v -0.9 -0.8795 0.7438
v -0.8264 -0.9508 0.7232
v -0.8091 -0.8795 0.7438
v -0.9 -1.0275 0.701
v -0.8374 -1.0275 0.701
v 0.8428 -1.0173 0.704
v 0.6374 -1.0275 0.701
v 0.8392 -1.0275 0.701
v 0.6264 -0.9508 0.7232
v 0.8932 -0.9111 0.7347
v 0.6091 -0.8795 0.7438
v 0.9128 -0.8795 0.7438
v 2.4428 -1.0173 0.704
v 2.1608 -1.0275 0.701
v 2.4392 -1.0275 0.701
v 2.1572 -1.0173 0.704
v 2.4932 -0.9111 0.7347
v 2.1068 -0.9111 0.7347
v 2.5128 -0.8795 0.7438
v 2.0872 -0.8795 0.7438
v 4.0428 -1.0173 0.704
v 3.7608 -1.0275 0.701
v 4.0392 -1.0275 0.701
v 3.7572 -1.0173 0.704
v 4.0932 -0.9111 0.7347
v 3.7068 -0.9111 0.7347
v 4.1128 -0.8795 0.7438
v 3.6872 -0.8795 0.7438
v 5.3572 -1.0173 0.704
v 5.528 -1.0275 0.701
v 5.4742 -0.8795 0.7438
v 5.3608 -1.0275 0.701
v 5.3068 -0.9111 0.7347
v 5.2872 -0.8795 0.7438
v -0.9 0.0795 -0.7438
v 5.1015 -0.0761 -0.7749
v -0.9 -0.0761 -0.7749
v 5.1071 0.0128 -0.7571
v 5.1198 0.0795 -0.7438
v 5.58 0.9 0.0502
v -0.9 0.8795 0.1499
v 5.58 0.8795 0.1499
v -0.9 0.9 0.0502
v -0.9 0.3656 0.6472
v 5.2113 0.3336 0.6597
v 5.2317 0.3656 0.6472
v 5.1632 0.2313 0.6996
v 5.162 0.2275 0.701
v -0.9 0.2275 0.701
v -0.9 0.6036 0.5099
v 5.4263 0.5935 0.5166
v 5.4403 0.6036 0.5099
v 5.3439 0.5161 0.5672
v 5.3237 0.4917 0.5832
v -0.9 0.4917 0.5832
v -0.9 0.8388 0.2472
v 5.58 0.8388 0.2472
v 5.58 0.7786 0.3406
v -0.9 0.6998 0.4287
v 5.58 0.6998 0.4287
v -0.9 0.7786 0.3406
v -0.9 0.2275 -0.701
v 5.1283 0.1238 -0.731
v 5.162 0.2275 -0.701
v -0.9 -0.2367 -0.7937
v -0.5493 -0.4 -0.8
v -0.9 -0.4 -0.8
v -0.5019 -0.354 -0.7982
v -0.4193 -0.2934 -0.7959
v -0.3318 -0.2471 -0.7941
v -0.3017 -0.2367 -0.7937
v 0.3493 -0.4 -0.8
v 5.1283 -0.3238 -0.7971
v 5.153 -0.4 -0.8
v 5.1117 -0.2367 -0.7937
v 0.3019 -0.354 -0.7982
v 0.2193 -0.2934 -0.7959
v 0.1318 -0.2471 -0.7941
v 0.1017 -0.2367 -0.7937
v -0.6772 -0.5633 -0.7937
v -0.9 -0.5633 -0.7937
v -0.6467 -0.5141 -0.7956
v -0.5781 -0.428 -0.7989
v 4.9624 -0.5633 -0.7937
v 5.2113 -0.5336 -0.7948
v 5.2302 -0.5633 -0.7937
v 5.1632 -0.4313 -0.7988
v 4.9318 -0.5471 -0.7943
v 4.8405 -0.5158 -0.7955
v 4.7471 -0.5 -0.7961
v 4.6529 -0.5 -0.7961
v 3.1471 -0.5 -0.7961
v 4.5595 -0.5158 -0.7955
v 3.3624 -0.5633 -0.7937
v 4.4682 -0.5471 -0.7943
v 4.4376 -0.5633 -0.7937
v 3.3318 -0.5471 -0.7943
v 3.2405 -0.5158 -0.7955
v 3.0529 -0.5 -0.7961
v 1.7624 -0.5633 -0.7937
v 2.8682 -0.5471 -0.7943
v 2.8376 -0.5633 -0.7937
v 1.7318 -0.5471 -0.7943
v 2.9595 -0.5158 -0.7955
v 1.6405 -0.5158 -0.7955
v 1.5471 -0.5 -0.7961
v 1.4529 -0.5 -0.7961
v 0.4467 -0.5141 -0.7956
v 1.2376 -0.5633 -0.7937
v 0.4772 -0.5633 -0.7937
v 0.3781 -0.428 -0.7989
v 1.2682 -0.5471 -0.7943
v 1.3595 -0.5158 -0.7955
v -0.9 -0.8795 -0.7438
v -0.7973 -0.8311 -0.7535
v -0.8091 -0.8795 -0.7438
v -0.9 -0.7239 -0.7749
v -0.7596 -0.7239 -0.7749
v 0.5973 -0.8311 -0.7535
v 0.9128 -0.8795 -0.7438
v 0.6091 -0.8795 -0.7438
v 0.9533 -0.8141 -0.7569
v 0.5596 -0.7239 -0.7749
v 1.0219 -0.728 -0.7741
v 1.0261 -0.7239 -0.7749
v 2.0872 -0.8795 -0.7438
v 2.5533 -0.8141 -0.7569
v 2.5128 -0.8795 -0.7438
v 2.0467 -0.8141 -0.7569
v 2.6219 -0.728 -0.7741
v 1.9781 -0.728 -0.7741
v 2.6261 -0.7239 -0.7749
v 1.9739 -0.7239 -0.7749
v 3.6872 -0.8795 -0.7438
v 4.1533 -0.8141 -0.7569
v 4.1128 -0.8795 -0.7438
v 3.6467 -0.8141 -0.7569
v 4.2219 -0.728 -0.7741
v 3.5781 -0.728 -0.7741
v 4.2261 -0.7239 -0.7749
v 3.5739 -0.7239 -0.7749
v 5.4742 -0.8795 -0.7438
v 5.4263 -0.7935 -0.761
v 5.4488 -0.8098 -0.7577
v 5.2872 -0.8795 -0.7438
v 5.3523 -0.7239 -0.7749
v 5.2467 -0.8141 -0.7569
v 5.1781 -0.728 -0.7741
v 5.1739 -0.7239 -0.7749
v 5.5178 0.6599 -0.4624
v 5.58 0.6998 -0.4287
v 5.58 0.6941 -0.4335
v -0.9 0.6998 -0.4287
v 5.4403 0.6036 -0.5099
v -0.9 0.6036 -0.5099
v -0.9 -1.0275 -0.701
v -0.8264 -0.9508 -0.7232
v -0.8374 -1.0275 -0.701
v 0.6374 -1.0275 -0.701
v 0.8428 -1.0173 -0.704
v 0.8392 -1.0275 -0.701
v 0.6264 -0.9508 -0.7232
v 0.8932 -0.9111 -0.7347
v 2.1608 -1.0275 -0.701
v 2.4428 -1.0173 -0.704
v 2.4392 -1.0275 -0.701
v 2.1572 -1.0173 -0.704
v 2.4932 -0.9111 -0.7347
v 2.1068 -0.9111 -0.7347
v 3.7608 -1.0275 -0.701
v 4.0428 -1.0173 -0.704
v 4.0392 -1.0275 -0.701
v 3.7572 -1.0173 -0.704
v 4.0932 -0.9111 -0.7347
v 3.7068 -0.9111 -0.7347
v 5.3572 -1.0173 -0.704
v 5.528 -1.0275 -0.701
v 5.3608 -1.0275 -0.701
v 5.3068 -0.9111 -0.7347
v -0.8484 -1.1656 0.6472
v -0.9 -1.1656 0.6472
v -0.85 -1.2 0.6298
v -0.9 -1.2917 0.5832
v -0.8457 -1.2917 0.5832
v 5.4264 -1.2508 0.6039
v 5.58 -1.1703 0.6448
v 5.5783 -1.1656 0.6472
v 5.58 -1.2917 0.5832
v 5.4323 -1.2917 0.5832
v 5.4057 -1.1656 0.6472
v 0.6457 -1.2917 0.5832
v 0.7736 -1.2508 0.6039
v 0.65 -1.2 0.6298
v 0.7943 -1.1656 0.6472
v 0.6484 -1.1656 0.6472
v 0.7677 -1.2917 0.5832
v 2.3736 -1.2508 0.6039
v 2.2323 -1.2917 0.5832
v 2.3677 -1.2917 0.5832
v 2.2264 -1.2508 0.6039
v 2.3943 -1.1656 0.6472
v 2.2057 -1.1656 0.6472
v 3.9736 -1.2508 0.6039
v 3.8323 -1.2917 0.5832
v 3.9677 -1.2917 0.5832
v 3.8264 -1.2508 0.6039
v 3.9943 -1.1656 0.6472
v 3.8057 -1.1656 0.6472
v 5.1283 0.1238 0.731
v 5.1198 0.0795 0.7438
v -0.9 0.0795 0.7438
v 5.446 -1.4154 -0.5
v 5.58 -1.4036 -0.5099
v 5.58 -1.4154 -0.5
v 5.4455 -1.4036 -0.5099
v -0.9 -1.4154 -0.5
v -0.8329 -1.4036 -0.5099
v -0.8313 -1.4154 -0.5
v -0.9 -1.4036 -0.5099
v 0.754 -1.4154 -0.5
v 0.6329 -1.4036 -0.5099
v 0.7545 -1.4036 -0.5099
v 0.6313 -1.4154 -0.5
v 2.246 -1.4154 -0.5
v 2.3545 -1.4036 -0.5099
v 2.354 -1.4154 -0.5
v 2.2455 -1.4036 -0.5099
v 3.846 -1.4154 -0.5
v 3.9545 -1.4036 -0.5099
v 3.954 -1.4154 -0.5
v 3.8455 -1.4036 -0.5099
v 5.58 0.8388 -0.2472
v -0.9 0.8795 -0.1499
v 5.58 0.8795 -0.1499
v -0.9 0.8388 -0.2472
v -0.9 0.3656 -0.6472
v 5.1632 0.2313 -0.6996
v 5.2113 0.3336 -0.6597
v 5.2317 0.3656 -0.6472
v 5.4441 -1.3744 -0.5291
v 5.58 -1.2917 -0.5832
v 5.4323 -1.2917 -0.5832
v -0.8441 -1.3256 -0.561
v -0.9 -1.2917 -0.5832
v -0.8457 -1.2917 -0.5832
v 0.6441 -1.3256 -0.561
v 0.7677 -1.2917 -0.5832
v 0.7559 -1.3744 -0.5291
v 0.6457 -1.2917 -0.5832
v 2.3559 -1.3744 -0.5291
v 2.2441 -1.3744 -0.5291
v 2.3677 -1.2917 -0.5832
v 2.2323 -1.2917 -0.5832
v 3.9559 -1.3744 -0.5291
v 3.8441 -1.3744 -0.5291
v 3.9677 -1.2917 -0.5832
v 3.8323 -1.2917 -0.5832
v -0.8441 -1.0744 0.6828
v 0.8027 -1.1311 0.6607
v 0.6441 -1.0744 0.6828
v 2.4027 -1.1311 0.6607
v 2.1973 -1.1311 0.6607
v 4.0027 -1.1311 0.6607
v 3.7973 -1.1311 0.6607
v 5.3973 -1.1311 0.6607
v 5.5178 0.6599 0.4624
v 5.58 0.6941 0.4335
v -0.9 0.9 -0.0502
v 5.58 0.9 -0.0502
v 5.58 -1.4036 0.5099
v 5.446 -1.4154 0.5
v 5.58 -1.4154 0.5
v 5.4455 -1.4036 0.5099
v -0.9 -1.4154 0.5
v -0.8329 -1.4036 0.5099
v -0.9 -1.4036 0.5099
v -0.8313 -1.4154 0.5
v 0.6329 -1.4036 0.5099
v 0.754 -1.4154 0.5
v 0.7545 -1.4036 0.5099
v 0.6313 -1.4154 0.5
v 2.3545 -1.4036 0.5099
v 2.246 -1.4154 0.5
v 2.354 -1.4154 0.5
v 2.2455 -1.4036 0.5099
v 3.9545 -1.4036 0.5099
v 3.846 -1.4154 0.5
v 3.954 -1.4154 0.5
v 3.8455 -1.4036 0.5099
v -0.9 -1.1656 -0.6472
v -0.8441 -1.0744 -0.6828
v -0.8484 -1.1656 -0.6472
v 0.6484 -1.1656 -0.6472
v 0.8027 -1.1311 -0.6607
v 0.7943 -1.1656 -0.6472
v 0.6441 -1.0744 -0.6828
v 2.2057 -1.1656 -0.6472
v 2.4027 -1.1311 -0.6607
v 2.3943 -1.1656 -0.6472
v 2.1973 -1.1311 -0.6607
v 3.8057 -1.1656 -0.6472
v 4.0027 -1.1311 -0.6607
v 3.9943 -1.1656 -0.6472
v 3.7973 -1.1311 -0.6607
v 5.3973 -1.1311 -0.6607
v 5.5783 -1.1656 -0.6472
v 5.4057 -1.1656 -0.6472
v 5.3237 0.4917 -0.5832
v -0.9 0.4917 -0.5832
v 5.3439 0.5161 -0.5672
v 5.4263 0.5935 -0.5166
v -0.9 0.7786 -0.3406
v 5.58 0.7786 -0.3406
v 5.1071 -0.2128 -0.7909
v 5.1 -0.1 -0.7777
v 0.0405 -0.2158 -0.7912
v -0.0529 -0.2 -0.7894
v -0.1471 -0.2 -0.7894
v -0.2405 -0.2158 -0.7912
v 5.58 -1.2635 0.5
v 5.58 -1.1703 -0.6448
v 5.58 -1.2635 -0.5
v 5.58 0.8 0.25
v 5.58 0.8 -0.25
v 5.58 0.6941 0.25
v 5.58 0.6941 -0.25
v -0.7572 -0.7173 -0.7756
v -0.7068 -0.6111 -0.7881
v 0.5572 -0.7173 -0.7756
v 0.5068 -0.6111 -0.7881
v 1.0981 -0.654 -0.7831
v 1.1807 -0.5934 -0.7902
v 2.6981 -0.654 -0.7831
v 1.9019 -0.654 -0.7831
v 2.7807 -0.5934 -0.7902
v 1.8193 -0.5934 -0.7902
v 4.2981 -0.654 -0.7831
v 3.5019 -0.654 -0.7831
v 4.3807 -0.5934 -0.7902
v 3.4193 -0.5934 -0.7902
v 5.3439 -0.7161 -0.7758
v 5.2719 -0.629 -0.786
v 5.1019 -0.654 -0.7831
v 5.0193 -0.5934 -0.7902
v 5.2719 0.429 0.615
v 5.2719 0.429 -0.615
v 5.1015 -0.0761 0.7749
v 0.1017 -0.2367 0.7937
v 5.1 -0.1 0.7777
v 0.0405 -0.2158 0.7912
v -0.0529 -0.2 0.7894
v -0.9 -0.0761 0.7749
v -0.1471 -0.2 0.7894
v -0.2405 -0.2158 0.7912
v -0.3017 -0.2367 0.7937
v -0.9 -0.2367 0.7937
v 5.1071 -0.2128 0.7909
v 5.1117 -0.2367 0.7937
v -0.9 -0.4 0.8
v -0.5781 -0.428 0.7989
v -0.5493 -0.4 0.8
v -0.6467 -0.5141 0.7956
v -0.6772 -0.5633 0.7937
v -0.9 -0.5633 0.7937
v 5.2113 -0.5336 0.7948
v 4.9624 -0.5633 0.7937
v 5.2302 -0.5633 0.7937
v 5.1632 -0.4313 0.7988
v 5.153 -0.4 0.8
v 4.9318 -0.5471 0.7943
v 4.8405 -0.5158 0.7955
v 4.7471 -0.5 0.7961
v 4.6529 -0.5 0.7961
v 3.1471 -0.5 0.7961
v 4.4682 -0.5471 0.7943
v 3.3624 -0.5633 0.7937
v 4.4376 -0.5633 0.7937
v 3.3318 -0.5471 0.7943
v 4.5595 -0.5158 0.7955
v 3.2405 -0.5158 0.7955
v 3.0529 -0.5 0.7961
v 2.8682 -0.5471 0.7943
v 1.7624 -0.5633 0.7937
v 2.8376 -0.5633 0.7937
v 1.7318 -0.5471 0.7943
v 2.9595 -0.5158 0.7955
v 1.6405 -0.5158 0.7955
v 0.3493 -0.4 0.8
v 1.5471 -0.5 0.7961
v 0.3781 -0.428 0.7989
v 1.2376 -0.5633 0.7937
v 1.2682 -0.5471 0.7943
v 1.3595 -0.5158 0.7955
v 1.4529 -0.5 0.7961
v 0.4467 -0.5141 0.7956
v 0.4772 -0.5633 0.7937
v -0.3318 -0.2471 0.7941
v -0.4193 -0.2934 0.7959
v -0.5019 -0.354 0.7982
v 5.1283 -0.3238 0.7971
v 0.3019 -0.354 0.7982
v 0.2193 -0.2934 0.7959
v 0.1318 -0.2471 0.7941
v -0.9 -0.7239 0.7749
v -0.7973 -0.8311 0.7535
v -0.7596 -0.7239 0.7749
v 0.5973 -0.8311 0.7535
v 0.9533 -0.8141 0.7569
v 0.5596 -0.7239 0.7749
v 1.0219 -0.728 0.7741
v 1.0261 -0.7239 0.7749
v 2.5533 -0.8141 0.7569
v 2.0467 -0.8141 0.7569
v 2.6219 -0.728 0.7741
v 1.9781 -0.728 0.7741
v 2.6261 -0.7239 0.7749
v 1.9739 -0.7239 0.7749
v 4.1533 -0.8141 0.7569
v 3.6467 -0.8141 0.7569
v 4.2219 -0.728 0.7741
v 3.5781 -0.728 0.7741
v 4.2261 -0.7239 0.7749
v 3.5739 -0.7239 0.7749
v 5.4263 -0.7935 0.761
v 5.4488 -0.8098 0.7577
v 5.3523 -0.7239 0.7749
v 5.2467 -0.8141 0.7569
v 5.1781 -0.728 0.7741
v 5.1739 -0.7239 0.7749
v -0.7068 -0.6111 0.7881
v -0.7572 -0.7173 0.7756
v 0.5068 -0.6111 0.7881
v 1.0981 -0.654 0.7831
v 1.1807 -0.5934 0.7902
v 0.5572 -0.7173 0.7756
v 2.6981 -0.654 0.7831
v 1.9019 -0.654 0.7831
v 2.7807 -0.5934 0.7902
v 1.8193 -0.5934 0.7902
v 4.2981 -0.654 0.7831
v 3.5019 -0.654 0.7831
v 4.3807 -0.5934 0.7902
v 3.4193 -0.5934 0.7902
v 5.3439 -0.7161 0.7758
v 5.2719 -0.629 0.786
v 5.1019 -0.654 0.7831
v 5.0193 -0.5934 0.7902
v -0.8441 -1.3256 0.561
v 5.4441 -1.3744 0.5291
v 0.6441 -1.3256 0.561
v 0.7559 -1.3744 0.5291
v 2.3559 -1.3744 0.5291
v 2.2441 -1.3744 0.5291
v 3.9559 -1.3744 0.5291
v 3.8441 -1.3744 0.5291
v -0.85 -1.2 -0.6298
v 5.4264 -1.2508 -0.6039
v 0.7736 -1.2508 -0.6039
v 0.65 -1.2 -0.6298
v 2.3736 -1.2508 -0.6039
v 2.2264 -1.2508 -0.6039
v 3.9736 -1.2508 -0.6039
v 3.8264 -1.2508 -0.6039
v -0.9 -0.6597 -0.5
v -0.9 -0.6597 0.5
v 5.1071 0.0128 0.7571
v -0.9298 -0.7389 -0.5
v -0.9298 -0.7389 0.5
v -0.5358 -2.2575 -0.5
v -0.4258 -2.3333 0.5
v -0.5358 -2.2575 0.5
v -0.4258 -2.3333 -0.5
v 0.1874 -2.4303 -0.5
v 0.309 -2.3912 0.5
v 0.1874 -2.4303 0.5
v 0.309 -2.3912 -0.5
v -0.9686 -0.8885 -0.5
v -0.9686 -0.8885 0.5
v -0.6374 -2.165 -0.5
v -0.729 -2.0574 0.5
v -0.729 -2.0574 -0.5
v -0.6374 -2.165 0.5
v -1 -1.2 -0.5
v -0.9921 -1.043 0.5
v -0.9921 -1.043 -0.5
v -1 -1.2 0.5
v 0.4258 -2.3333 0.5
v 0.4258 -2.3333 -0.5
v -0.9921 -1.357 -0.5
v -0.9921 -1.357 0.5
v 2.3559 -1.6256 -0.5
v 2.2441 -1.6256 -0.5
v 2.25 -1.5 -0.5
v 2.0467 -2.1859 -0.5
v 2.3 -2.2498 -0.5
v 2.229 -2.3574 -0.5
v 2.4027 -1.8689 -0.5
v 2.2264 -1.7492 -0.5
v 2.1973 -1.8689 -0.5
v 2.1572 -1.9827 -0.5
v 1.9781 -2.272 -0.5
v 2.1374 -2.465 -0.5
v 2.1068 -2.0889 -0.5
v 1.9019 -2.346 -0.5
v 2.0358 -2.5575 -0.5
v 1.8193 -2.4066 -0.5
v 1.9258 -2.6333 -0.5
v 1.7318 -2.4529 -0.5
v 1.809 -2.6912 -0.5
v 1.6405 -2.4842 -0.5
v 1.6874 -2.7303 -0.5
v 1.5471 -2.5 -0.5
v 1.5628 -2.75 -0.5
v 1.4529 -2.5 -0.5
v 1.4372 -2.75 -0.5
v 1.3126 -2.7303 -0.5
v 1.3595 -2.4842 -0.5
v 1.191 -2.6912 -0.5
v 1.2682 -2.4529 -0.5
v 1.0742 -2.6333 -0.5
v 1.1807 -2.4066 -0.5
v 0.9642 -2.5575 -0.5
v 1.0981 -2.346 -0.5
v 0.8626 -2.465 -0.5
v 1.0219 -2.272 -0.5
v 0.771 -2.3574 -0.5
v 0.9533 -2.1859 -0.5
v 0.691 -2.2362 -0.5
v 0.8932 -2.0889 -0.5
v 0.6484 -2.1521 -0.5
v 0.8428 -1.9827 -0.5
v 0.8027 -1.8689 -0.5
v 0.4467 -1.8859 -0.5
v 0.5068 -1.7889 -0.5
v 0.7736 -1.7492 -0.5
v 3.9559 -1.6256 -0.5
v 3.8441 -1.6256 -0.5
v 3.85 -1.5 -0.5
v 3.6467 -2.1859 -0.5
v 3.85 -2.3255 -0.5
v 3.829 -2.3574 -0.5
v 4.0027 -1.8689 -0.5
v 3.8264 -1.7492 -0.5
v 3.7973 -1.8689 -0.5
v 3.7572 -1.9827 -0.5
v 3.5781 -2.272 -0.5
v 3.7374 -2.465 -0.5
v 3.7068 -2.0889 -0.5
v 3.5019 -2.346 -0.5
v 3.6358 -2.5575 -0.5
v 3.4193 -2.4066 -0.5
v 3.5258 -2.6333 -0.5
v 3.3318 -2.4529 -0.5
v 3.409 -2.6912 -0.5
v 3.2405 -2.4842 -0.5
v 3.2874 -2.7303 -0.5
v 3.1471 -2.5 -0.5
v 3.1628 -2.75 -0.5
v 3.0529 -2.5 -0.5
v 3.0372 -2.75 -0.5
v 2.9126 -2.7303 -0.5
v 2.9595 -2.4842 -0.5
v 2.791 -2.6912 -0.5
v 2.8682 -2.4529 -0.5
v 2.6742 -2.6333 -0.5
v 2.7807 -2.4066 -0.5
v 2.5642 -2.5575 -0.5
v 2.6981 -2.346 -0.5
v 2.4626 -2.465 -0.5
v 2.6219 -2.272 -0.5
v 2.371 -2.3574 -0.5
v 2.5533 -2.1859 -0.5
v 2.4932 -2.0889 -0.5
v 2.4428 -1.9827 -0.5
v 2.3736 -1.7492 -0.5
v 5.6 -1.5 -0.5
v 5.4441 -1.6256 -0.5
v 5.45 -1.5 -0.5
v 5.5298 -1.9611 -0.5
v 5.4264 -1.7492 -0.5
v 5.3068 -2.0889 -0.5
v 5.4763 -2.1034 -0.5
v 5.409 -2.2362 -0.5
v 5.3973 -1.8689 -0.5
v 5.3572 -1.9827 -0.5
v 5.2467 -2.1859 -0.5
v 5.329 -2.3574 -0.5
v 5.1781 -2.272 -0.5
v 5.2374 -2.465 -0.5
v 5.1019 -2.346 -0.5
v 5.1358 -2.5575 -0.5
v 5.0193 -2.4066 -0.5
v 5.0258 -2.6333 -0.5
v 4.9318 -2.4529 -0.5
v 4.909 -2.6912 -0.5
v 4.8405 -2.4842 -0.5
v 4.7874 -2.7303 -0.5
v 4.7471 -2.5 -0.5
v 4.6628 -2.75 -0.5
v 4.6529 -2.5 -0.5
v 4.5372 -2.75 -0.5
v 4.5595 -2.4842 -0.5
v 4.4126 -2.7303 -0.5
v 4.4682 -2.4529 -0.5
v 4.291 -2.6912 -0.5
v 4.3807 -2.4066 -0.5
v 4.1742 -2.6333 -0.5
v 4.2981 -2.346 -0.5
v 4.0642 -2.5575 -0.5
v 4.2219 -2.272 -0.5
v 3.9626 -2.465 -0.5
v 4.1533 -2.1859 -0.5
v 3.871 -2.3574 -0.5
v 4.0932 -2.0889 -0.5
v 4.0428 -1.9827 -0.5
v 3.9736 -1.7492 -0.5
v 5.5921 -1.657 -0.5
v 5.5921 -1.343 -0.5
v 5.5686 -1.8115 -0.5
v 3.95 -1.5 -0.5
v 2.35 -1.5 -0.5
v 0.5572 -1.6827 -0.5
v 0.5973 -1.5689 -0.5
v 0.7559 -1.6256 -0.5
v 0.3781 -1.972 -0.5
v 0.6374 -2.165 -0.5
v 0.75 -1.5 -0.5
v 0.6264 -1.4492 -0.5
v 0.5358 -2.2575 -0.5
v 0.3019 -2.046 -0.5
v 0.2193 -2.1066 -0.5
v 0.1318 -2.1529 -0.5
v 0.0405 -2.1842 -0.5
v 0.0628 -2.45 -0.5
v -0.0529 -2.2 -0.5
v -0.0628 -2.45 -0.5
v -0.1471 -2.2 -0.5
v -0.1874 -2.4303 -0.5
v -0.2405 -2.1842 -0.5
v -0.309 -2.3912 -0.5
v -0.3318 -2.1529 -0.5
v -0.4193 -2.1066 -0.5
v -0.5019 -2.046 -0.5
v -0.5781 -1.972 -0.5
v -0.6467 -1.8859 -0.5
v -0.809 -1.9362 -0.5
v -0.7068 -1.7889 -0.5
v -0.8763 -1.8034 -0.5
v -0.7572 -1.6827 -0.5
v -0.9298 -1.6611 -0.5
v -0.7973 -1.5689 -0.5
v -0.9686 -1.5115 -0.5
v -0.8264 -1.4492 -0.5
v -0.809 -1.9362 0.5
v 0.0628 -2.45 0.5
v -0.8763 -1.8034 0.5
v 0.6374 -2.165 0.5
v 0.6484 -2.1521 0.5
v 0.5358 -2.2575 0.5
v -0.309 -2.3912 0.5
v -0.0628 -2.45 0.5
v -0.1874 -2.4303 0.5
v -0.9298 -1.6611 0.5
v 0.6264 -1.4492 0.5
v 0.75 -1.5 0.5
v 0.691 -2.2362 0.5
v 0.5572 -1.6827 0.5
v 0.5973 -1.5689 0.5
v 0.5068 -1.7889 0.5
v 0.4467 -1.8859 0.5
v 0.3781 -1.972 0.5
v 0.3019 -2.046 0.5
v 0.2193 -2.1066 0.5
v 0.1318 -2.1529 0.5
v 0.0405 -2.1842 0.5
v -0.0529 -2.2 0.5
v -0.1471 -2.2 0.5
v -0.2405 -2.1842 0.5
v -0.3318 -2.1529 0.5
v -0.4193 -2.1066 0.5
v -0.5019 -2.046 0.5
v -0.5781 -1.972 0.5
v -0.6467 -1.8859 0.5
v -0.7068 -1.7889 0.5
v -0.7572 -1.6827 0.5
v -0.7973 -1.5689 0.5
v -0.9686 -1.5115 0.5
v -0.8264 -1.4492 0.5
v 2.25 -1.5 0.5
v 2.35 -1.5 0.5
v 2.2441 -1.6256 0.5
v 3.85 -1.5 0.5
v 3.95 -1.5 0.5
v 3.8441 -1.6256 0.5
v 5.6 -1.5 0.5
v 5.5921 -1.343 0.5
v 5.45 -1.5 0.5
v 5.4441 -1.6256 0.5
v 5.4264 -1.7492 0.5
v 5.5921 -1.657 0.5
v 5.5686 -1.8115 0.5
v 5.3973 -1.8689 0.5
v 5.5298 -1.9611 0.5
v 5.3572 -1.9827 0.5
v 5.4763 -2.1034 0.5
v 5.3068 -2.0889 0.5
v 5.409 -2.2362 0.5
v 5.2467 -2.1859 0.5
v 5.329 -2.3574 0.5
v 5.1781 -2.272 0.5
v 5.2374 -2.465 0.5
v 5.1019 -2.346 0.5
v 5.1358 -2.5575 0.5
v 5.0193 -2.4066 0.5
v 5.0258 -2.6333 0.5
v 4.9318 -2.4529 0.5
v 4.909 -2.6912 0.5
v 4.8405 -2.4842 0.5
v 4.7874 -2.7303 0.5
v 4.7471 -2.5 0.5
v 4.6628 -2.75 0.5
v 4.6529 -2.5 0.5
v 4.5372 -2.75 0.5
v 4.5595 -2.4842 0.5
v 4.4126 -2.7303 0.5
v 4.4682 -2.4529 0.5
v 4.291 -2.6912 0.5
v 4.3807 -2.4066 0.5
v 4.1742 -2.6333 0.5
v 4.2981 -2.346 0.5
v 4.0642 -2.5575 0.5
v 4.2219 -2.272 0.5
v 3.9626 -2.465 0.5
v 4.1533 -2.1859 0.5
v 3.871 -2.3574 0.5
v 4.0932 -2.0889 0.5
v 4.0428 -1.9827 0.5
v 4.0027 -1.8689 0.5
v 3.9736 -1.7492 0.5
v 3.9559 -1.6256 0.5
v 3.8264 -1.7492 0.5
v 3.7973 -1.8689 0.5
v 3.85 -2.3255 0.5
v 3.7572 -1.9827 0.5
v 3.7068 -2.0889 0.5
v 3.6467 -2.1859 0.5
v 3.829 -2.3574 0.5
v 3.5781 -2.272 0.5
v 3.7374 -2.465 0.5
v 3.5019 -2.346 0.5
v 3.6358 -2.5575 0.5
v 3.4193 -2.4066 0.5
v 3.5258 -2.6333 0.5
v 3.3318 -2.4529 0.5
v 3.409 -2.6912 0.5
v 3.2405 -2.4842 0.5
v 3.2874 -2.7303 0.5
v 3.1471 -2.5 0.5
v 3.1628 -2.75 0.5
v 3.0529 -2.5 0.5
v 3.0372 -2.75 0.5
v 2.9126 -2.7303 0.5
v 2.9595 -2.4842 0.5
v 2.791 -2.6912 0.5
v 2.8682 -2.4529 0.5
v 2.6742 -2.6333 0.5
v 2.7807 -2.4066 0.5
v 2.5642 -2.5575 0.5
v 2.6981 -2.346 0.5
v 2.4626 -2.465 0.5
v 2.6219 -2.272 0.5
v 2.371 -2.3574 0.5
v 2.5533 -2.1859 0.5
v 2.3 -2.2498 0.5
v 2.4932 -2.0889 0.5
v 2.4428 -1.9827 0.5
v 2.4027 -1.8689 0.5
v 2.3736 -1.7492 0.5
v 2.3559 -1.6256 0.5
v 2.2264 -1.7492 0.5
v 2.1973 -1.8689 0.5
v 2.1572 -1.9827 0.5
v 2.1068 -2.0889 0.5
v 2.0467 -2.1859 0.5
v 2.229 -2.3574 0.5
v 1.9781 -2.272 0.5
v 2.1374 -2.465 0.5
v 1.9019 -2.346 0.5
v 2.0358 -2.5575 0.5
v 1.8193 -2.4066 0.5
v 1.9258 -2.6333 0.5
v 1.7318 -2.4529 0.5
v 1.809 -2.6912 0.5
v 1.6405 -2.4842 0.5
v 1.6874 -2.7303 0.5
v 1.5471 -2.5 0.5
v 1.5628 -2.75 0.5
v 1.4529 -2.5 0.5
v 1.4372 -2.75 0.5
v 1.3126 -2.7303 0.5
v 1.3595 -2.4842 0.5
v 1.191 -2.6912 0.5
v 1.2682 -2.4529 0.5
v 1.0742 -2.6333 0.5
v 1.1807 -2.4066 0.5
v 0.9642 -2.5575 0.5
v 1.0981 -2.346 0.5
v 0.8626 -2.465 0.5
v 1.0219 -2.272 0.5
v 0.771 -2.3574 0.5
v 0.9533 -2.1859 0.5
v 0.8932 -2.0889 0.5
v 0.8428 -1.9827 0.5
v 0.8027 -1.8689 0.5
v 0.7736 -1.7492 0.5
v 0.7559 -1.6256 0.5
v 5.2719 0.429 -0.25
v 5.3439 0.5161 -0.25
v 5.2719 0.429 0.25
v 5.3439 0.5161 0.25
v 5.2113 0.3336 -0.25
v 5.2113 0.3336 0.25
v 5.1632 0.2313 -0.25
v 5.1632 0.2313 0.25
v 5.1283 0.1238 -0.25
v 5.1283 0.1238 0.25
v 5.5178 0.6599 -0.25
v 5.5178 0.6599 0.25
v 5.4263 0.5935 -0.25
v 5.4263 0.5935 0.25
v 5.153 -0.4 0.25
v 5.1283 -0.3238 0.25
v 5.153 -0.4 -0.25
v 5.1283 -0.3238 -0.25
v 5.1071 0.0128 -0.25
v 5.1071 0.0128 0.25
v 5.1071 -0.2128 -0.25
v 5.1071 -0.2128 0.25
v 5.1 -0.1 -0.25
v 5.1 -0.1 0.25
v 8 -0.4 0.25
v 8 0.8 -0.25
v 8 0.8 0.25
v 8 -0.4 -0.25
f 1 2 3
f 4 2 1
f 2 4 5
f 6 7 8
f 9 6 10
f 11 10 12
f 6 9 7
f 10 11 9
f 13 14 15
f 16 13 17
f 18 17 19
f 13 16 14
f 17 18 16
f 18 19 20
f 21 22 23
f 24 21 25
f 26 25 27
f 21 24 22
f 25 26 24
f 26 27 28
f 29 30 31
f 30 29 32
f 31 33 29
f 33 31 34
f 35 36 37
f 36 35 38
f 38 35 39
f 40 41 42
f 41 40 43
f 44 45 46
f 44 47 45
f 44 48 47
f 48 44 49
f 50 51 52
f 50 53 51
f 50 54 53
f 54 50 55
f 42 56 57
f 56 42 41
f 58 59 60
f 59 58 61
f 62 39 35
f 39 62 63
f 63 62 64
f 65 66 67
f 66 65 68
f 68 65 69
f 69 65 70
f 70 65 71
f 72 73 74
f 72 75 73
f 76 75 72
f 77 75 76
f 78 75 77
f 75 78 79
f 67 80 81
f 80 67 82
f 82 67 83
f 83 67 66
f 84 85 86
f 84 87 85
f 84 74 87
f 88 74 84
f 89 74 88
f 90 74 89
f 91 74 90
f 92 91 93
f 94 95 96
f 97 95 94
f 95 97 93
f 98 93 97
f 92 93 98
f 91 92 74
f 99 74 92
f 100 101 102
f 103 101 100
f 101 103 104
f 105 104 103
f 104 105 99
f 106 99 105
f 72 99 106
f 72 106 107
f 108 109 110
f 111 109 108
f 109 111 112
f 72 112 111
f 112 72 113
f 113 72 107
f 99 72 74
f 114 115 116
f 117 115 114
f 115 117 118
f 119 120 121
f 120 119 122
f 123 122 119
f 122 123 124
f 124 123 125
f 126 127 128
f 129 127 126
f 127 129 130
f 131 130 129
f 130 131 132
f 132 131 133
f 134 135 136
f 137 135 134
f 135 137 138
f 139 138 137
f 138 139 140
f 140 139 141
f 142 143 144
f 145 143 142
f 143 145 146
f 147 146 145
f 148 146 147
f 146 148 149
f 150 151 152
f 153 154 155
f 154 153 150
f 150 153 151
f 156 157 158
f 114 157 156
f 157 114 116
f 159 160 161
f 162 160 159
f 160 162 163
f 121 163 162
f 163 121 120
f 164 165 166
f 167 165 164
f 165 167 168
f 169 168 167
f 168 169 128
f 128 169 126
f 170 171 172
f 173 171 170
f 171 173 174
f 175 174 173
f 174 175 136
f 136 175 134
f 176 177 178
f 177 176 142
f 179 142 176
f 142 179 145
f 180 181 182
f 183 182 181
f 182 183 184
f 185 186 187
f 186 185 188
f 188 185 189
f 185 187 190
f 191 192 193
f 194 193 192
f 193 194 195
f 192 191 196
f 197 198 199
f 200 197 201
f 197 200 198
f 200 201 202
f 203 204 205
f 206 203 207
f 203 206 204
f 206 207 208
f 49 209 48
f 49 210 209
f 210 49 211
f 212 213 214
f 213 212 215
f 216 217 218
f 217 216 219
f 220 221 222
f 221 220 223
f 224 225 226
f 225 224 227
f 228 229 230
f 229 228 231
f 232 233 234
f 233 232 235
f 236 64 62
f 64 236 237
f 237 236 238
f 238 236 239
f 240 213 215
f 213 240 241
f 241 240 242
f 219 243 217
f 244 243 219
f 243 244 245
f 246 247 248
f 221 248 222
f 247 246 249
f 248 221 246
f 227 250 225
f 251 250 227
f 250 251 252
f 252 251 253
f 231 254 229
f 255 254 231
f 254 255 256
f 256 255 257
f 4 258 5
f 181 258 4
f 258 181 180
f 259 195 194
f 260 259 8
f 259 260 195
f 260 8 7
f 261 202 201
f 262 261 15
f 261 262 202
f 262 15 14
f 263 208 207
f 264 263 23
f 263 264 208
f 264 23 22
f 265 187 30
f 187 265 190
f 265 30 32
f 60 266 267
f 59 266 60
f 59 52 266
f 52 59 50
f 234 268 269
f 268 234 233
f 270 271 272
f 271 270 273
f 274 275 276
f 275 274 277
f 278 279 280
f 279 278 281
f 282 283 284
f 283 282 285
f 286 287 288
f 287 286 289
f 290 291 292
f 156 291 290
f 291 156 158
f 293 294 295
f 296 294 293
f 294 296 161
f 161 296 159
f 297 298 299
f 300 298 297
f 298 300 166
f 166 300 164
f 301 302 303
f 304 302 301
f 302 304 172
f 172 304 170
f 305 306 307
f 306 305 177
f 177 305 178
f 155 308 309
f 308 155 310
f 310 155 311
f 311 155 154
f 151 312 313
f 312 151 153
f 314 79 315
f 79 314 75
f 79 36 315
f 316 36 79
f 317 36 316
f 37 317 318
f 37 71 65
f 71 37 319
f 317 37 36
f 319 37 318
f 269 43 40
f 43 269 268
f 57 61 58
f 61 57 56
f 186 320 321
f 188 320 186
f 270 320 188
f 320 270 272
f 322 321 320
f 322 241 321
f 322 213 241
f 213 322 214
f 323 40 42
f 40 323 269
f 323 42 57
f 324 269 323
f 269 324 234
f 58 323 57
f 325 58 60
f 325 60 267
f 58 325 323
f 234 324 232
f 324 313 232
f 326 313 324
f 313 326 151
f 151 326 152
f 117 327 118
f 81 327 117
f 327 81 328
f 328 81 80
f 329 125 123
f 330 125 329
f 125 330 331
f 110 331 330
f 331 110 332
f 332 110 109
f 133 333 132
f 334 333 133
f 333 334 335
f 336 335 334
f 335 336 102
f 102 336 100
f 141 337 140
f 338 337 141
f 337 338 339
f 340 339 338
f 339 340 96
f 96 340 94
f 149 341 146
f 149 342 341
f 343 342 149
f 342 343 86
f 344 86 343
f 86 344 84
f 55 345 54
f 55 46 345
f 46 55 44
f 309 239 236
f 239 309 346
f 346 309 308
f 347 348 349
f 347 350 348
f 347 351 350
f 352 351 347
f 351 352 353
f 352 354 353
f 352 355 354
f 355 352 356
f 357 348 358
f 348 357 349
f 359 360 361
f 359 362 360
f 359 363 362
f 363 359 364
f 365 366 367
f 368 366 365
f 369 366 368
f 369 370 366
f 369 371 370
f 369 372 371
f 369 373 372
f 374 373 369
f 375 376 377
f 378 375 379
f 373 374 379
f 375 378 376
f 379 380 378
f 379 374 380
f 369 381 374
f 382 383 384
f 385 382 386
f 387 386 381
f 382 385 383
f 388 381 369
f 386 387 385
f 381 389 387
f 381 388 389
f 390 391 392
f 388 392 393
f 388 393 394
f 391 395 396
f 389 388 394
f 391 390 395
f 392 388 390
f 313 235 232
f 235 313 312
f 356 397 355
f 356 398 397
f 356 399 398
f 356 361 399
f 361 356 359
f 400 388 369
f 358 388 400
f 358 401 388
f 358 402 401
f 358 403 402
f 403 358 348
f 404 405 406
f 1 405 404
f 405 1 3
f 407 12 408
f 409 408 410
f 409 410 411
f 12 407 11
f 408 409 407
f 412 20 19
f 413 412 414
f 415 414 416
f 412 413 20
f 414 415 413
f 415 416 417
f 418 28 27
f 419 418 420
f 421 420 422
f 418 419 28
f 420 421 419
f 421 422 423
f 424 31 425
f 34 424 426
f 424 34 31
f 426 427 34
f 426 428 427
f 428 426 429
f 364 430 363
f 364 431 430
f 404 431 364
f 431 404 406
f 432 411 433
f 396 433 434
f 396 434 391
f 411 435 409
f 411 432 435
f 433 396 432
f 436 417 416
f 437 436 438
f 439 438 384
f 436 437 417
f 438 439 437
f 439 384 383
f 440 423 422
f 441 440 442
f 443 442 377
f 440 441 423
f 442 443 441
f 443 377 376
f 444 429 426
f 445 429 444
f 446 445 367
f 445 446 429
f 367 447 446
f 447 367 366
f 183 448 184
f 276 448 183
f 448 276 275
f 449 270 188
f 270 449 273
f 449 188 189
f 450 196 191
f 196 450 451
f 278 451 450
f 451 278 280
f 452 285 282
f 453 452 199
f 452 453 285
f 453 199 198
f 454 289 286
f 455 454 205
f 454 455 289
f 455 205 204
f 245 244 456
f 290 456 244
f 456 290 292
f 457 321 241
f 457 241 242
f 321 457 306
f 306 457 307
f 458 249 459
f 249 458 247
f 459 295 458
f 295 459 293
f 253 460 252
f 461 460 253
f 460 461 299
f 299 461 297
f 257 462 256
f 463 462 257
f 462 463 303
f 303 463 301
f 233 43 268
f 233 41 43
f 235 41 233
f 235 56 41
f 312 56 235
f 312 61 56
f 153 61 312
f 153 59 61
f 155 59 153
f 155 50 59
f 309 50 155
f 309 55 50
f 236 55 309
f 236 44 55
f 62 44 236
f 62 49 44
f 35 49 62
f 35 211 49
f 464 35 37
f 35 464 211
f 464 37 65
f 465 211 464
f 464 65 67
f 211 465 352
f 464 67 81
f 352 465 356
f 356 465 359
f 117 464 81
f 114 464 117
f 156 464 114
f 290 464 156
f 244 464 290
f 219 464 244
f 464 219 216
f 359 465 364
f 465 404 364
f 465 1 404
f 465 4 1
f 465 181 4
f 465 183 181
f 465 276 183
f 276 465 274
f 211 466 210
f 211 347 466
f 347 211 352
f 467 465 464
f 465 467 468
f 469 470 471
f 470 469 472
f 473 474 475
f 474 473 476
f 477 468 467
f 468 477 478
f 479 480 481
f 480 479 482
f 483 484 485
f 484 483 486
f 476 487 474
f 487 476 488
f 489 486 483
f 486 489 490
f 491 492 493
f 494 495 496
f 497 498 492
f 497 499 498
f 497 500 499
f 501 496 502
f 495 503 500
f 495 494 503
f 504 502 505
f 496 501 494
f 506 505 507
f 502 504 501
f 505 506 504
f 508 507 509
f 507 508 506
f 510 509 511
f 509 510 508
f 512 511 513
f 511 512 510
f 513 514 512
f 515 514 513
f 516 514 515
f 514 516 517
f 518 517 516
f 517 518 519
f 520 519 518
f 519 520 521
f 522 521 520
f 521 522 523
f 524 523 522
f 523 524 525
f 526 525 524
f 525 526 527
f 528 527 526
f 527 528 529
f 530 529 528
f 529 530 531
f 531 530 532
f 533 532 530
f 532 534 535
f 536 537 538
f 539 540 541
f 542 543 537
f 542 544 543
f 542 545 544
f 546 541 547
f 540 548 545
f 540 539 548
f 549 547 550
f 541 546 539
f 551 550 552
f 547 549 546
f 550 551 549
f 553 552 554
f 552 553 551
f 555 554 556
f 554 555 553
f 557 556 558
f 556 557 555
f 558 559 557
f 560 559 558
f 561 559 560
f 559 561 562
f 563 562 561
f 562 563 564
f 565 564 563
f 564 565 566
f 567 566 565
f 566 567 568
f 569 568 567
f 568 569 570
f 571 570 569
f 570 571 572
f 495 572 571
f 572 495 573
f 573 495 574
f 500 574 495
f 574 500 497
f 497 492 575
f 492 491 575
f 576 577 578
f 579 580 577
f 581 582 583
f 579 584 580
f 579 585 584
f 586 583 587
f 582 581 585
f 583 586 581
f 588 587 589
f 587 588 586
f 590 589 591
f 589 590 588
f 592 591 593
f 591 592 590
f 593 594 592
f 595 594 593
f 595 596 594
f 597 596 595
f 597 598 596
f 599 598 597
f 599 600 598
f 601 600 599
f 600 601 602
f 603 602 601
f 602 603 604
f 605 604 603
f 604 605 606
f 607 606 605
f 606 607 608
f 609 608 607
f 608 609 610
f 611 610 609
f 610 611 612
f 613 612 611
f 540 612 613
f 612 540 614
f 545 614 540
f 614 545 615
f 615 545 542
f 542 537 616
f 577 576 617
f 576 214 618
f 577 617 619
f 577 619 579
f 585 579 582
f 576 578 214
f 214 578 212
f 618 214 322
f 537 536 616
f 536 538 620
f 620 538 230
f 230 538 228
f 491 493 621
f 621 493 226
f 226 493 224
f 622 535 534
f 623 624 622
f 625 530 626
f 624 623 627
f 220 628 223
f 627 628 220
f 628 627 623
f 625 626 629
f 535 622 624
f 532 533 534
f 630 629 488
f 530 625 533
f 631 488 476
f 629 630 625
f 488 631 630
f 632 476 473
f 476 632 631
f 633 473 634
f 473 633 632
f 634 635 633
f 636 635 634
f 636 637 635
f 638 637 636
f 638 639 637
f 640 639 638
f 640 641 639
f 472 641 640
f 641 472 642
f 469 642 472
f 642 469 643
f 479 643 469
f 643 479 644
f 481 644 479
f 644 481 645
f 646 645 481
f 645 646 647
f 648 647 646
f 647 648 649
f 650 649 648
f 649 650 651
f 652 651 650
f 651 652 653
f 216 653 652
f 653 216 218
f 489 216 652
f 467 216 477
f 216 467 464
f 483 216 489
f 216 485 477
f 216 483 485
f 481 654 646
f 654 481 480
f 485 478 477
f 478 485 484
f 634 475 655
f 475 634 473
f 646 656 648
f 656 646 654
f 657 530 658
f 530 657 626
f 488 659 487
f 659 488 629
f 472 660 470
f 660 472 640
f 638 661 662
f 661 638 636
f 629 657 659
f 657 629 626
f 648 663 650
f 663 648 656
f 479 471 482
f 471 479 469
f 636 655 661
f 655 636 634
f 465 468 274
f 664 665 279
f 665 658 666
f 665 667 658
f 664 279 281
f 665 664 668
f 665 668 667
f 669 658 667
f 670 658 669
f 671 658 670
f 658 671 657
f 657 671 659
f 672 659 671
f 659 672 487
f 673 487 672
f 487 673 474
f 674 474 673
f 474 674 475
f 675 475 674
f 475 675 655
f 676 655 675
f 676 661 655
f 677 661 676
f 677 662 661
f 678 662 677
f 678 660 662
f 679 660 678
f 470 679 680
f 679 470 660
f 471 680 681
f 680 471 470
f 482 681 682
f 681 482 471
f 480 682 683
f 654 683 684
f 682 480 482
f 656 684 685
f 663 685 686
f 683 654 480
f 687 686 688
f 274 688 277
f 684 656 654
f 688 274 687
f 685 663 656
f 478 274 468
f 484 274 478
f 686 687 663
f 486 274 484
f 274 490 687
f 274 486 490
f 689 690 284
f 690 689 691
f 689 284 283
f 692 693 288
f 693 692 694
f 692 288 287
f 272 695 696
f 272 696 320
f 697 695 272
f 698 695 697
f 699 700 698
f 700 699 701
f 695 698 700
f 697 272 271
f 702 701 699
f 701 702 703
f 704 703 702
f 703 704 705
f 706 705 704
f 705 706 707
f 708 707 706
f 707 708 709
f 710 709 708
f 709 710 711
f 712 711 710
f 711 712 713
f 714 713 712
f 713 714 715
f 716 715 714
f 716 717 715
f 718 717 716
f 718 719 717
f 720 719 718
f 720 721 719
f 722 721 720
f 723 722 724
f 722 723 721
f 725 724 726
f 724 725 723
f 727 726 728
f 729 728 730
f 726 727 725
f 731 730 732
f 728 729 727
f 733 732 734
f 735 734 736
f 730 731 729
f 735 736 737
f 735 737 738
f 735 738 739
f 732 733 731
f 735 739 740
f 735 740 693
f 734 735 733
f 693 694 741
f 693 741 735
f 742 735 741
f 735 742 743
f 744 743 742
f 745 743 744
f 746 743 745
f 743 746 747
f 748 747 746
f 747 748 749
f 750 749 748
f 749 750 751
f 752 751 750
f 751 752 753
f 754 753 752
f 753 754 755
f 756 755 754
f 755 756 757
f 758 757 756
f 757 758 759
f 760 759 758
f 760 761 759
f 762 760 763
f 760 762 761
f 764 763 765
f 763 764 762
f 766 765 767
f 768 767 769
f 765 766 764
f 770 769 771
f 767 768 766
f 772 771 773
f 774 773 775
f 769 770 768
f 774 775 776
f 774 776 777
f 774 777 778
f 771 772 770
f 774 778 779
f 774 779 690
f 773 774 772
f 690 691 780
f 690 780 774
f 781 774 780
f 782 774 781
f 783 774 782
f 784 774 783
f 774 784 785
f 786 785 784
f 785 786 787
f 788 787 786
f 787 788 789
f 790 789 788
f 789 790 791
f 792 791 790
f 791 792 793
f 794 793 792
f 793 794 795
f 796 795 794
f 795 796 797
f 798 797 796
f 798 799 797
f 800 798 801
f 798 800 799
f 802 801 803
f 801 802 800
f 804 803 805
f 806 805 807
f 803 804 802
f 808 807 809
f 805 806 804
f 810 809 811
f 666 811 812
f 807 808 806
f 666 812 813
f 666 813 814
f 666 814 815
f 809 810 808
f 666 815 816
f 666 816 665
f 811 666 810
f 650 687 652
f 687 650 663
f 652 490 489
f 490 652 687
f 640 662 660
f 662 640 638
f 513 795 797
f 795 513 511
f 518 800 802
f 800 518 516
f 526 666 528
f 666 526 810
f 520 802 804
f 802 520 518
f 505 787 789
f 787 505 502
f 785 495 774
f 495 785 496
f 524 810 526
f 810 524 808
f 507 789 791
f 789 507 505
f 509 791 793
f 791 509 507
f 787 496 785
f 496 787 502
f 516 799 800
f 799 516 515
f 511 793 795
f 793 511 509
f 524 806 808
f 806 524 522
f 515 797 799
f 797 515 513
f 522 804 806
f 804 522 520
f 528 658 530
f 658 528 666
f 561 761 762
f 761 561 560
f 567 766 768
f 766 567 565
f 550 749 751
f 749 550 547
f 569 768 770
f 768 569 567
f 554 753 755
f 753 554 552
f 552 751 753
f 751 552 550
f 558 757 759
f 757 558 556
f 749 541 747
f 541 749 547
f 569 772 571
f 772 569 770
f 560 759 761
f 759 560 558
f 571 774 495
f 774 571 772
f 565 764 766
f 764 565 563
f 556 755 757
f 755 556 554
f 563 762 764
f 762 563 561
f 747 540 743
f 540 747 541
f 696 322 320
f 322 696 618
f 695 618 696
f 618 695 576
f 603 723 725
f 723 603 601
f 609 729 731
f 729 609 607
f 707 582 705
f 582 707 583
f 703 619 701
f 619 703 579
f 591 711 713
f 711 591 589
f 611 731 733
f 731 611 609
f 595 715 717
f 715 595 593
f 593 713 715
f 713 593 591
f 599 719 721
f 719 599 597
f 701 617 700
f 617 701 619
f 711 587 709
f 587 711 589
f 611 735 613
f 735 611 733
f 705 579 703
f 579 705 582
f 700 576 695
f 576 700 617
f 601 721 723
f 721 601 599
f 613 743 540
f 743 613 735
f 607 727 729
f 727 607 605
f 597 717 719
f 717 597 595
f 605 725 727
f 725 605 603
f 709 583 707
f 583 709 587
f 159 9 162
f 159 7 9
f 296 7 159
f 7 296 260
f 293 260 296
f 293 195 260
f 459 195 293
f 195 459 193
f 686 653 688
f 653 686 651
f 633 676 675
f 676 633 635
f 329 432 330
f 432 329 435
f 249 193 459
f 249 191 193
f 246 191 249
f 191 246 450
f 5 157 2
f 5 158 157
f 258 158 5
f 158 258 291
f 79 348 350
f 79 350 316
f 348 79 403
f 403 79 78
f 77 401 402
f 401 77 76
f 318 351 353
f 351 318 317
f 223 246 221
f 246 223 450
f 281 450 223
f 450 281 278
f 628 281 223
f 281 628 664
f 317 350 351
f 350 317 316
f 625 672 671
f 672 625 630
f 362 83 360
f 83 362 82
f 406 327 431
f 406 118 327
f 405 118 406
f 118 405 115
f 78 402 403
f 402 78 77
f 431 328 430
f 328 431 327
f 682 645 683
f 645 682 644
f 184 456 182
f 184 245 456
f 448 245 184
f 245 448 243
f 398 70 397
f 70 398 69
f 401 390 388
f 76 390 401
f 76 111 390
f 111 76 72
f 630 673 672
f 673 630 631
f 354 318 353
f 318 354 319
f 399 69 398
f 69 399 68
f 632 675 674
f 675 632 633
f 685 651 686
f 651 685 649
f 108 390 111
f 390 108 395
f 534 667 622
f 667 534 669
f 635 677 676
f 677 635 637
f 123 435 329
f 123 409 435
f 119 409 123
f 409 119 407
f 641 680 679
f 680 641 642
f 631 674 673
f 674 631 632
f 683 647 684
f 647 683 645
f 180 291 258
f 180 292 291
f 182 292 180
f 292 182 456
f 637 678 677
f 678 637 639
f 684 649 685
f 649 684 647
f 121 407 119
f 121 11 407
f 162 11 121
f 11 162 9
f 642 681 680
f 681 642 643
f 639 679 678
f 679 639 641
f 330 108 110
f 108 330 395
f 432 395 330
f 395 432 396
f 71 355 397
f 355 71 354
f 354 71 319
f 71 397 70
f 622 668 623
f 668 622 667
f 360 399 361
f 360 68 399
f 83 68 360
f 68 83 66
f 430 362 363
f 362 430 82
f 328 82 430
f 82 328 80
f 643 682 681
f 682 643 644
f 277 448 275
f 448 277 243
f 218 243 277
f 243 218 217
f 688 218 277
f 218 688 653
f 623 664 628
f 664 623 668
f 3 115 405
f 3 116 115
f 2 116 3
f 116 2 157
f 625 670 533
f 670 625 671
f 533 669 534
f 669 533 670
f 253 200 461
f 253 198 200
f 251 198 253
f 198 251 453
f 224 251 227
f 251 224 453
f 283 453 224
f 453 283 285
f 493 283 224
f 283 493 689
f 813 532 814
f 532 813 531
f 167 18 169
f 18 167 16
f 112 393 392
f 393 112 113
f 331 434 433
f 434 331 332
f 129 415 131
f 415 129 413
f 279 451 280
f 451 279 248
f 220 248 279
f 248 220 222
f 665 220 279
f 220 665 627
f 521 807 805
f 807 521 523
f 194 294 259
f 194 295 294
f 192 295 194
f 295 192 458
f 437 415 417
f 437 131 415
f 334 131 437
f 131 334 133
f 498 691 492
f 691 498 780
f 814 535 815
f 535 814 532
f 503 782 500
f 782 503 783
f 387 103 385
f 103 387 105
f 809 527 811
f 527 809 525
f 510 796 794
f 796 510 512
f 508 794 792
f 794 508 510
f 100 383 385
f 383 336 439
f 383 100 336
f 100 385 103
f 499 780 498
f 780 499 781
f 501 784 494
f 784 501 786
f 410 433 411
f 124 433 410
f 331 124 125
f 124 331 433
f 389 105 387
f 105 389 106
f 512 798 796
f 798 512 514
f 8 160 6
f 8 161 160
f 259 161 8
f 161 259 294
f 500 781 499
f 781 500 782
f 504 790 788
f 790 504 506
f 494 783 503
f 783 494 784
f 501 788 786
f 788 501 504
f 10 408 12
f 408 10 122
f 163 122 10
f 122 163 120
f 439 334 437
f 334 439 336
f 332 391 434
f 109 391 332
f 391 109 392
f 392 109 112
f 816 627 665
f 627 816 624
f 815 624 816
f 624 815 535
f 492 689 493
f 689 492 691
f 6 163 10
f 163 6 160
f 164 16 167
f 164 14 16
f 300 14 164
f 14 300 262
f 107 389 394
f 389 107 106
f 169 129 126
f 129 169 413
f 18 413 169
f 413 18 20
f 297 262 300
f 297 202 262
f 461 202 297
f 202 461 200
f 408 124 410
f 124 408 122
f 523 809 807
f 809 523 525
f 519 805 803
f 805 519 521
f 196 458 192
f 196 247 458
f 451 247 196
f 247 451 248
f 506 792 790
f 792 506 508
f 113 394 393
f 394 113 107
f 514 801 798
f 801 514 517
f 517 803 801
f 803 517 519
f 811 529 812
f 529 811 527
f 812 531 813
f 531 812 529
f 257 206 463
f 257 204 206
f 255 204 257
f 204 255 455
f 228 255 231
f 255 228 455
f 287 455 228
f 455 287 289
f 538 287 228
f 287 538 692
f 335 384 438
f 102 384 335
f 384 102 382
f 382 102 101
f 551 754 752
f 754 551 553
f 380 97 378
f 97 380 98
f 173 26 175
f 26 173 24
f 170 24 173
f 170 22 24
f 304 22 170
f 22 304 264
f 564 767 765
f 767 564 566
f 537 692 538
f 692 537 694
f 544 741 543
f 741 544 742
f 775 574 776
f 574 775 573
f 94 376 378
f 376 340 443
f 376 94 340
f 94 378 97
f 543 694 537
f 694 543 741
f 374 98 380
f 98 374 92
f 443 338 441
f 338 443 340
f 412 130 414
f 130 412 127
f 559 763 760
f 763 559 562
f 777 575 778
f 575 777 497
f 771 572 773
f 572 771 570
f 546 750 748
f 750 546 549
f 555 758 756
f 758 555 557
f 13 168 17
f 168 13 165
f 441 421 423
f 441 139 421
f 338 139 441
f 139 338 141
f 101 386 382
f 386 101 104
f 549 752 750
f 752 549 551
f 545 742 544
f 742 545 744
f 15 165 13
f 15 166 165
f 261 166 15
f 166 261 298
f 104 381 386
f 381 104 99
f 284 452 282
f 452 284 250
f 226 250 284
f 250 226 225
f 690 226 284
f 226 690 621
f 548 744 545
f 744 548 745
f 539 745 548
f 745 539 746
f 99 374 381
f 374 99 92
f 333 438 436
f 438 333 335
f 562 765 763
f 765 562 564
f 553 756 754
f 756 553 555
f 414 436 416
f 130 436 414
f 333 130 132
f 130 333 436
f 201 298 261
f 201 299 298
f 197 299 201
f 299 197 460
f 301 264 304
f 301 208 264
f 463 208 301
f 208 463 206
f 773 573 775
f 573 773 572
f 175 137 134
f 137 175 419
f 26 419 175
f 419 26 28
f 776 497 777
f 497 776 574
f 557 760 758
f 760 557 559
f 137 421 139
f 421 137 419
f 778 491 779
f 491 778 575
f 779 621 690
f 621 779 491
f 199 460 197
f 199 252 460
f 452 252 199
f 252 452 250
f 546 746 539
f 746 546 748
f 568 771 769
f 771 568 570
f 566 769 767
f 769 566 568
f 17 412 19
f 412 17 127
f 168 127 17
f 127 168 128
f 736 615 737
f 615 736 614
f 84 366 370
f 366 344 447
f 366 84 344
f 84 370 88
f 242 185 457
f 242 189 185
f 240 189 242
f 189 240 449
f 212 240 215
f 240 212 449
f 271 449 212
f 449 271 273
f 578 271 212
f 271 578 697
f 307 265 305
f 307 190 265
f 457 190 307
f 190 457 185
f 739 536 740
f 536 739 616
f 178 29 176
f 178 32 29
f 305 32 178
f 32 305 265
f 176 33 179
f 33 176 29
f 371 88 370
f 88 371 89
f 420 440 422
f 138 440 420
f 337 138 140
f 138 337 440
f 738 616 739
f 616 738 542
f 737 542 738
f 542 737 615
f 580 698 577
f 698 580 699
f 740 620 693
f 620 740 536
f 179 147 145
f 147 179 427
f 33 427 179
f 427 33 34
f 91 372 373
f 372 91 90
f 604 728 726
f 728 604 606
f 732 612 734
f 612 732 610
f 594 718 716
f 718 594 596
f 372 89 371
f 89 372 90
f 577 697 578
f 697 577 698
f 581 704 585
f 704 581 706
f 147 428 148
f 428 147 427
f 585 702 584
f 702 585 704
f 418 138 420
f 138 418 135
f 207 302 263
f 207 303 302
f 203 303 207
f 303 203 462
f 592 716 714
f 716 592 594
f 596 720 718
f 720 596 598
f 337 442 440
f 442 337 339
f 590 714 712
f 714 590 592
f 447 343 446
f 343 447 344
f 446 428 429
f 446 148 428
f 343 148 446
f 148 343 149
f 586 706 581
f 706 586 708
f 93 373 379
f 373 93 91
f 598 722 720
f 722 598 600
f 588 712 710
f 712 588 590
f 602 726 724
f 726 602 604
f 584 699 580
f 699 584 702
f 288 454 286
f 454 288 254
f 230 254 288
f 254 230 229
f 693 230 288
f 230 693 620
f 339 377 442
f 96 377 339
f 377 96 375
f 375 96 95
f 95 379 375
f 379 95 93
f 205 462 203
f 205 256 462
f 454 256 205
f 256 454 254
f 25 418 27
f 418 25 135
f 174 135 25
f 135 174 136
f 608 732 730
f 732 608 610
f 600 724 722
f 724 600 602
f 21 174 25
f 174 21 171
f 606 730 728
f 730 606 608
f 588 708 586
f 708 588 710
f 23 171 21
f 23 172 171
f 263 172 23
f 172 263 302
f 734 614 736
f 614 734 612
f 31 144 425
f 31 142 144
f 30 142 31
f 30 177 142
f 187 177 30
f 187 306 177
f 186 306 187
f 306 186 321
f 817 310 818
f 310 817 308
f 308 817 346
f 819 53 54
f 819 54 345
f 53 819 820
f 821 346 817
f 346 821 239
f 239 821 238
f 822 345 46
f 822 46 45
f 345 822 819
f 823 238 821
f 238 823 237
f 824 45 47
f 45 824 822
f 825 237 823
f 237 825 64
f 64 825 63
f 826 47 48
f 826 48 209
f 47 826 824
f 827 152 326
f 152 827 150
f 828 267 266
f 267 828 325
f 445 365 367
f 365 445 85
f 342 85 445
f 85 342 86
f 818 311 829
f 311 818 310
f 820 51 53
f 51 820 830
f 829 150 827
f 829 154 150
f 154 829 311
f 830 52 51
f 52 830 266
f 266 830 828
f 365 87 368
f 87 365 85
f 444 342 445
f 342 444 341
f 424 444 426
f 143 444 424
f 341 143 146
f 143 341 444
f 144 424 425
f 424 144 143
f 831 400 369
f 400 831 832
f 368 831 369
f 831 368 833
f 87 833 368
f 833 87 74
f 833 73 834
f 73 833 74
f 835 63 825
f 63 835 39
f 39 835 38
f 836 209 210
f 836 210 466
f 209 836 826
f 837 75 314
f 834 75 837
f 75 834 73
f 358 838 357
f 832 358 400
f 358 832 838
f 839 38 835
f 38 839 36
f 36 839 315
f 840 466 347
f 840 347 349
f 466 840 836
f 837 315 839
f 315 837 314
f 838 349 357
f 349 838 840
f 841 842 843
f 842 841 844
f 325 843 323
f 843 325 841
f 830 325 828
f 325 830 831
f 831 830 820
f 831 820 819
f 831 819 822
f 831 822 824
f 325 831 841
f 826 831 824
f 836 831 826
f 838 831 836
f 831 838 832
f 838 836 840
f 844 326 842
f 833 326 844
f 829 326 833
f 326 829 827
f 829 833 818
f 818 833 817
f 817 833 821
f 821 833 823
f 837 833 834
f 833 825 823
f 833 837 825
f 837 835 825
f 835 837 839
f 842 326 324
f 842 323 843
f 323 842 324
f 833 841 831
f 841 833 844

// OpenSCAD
difference(){
    union(){
        // spine of handle
        translate([-.9,-0.4,0]){
            resize([0,2.6,0]){
                rotate([0,90,0]){
                    cylinder(r=0.8,h=6.48,$fn=50);
                }
            }
        }
        
        // finger guard shell
        translate([0,-1.2,-.5]){
            resize([0,2.5,0]){
                difference(){
                    cylinder(r=1,h=1,$fn=50);
                }
            }
        }
        translate([1.5,-1.5,-.5]){
            resize([0,2.5,0]){
                difference(){
                    cylinder(r=1,h=1,$fn=50);
                }
            }
        }
        translate([3.1,-1.5,-.5]){
            resize([0,2.5,0]){
                difference(){
                    cylinder(r=1,h=1,$fn=50);
                }
            }
        }
        translate([4.6,-1.5,-.5]){
            resize([0,2.5,0]){
                difference(){
                    cylinder(r=1,h=1,$fn=50);
                }
            }
        }
    }
    
    // finger guard holes
    translate([-0.1,-1.2,-2]){
        resize([0,2,0]){
            cylinder(r=.75,h=4,$fn=50);
        }
    }
    translate([1.5,-1.5,-2]){
        resize([0,2,0]){
            cylinder(r=.75,h=4,$fn=50);
        }
    }
    translate([3.1,-1.5,-2]){
        resize([0,2,0]){
            cylinder(r=.75,h=4,$fn=50);
        }
    }
    translate([4.7,-1.5,-2]){
        resize([0,2,0]){
        cylinder(r=.75,h=4,$fn=50);
        }
    }
    
    // blade cut-out
    translate([5.7,-1.5,-2]){
        rotate([0,0,20]){
            cube([5,1,4]);
        }
    }
    translate([6,-.1,-2]){
        cylinder(r=.9,h=4,$fn=50);
    }
    /*
    // round finger guards
    translate([-2,-1,0]){
        #resize([0,7,4.5]){
            rotate([0,90,0]){
                difference(){
                    cylinder(r=1,h=10,$fn=25);
                    cylinder(r=.50,h=10,$fn=50);
                }
            }
        }
    }
    */
}

// "blade"
translate([5,-0.4,-.25]){
    cube([3,1.2,.5]);
}
